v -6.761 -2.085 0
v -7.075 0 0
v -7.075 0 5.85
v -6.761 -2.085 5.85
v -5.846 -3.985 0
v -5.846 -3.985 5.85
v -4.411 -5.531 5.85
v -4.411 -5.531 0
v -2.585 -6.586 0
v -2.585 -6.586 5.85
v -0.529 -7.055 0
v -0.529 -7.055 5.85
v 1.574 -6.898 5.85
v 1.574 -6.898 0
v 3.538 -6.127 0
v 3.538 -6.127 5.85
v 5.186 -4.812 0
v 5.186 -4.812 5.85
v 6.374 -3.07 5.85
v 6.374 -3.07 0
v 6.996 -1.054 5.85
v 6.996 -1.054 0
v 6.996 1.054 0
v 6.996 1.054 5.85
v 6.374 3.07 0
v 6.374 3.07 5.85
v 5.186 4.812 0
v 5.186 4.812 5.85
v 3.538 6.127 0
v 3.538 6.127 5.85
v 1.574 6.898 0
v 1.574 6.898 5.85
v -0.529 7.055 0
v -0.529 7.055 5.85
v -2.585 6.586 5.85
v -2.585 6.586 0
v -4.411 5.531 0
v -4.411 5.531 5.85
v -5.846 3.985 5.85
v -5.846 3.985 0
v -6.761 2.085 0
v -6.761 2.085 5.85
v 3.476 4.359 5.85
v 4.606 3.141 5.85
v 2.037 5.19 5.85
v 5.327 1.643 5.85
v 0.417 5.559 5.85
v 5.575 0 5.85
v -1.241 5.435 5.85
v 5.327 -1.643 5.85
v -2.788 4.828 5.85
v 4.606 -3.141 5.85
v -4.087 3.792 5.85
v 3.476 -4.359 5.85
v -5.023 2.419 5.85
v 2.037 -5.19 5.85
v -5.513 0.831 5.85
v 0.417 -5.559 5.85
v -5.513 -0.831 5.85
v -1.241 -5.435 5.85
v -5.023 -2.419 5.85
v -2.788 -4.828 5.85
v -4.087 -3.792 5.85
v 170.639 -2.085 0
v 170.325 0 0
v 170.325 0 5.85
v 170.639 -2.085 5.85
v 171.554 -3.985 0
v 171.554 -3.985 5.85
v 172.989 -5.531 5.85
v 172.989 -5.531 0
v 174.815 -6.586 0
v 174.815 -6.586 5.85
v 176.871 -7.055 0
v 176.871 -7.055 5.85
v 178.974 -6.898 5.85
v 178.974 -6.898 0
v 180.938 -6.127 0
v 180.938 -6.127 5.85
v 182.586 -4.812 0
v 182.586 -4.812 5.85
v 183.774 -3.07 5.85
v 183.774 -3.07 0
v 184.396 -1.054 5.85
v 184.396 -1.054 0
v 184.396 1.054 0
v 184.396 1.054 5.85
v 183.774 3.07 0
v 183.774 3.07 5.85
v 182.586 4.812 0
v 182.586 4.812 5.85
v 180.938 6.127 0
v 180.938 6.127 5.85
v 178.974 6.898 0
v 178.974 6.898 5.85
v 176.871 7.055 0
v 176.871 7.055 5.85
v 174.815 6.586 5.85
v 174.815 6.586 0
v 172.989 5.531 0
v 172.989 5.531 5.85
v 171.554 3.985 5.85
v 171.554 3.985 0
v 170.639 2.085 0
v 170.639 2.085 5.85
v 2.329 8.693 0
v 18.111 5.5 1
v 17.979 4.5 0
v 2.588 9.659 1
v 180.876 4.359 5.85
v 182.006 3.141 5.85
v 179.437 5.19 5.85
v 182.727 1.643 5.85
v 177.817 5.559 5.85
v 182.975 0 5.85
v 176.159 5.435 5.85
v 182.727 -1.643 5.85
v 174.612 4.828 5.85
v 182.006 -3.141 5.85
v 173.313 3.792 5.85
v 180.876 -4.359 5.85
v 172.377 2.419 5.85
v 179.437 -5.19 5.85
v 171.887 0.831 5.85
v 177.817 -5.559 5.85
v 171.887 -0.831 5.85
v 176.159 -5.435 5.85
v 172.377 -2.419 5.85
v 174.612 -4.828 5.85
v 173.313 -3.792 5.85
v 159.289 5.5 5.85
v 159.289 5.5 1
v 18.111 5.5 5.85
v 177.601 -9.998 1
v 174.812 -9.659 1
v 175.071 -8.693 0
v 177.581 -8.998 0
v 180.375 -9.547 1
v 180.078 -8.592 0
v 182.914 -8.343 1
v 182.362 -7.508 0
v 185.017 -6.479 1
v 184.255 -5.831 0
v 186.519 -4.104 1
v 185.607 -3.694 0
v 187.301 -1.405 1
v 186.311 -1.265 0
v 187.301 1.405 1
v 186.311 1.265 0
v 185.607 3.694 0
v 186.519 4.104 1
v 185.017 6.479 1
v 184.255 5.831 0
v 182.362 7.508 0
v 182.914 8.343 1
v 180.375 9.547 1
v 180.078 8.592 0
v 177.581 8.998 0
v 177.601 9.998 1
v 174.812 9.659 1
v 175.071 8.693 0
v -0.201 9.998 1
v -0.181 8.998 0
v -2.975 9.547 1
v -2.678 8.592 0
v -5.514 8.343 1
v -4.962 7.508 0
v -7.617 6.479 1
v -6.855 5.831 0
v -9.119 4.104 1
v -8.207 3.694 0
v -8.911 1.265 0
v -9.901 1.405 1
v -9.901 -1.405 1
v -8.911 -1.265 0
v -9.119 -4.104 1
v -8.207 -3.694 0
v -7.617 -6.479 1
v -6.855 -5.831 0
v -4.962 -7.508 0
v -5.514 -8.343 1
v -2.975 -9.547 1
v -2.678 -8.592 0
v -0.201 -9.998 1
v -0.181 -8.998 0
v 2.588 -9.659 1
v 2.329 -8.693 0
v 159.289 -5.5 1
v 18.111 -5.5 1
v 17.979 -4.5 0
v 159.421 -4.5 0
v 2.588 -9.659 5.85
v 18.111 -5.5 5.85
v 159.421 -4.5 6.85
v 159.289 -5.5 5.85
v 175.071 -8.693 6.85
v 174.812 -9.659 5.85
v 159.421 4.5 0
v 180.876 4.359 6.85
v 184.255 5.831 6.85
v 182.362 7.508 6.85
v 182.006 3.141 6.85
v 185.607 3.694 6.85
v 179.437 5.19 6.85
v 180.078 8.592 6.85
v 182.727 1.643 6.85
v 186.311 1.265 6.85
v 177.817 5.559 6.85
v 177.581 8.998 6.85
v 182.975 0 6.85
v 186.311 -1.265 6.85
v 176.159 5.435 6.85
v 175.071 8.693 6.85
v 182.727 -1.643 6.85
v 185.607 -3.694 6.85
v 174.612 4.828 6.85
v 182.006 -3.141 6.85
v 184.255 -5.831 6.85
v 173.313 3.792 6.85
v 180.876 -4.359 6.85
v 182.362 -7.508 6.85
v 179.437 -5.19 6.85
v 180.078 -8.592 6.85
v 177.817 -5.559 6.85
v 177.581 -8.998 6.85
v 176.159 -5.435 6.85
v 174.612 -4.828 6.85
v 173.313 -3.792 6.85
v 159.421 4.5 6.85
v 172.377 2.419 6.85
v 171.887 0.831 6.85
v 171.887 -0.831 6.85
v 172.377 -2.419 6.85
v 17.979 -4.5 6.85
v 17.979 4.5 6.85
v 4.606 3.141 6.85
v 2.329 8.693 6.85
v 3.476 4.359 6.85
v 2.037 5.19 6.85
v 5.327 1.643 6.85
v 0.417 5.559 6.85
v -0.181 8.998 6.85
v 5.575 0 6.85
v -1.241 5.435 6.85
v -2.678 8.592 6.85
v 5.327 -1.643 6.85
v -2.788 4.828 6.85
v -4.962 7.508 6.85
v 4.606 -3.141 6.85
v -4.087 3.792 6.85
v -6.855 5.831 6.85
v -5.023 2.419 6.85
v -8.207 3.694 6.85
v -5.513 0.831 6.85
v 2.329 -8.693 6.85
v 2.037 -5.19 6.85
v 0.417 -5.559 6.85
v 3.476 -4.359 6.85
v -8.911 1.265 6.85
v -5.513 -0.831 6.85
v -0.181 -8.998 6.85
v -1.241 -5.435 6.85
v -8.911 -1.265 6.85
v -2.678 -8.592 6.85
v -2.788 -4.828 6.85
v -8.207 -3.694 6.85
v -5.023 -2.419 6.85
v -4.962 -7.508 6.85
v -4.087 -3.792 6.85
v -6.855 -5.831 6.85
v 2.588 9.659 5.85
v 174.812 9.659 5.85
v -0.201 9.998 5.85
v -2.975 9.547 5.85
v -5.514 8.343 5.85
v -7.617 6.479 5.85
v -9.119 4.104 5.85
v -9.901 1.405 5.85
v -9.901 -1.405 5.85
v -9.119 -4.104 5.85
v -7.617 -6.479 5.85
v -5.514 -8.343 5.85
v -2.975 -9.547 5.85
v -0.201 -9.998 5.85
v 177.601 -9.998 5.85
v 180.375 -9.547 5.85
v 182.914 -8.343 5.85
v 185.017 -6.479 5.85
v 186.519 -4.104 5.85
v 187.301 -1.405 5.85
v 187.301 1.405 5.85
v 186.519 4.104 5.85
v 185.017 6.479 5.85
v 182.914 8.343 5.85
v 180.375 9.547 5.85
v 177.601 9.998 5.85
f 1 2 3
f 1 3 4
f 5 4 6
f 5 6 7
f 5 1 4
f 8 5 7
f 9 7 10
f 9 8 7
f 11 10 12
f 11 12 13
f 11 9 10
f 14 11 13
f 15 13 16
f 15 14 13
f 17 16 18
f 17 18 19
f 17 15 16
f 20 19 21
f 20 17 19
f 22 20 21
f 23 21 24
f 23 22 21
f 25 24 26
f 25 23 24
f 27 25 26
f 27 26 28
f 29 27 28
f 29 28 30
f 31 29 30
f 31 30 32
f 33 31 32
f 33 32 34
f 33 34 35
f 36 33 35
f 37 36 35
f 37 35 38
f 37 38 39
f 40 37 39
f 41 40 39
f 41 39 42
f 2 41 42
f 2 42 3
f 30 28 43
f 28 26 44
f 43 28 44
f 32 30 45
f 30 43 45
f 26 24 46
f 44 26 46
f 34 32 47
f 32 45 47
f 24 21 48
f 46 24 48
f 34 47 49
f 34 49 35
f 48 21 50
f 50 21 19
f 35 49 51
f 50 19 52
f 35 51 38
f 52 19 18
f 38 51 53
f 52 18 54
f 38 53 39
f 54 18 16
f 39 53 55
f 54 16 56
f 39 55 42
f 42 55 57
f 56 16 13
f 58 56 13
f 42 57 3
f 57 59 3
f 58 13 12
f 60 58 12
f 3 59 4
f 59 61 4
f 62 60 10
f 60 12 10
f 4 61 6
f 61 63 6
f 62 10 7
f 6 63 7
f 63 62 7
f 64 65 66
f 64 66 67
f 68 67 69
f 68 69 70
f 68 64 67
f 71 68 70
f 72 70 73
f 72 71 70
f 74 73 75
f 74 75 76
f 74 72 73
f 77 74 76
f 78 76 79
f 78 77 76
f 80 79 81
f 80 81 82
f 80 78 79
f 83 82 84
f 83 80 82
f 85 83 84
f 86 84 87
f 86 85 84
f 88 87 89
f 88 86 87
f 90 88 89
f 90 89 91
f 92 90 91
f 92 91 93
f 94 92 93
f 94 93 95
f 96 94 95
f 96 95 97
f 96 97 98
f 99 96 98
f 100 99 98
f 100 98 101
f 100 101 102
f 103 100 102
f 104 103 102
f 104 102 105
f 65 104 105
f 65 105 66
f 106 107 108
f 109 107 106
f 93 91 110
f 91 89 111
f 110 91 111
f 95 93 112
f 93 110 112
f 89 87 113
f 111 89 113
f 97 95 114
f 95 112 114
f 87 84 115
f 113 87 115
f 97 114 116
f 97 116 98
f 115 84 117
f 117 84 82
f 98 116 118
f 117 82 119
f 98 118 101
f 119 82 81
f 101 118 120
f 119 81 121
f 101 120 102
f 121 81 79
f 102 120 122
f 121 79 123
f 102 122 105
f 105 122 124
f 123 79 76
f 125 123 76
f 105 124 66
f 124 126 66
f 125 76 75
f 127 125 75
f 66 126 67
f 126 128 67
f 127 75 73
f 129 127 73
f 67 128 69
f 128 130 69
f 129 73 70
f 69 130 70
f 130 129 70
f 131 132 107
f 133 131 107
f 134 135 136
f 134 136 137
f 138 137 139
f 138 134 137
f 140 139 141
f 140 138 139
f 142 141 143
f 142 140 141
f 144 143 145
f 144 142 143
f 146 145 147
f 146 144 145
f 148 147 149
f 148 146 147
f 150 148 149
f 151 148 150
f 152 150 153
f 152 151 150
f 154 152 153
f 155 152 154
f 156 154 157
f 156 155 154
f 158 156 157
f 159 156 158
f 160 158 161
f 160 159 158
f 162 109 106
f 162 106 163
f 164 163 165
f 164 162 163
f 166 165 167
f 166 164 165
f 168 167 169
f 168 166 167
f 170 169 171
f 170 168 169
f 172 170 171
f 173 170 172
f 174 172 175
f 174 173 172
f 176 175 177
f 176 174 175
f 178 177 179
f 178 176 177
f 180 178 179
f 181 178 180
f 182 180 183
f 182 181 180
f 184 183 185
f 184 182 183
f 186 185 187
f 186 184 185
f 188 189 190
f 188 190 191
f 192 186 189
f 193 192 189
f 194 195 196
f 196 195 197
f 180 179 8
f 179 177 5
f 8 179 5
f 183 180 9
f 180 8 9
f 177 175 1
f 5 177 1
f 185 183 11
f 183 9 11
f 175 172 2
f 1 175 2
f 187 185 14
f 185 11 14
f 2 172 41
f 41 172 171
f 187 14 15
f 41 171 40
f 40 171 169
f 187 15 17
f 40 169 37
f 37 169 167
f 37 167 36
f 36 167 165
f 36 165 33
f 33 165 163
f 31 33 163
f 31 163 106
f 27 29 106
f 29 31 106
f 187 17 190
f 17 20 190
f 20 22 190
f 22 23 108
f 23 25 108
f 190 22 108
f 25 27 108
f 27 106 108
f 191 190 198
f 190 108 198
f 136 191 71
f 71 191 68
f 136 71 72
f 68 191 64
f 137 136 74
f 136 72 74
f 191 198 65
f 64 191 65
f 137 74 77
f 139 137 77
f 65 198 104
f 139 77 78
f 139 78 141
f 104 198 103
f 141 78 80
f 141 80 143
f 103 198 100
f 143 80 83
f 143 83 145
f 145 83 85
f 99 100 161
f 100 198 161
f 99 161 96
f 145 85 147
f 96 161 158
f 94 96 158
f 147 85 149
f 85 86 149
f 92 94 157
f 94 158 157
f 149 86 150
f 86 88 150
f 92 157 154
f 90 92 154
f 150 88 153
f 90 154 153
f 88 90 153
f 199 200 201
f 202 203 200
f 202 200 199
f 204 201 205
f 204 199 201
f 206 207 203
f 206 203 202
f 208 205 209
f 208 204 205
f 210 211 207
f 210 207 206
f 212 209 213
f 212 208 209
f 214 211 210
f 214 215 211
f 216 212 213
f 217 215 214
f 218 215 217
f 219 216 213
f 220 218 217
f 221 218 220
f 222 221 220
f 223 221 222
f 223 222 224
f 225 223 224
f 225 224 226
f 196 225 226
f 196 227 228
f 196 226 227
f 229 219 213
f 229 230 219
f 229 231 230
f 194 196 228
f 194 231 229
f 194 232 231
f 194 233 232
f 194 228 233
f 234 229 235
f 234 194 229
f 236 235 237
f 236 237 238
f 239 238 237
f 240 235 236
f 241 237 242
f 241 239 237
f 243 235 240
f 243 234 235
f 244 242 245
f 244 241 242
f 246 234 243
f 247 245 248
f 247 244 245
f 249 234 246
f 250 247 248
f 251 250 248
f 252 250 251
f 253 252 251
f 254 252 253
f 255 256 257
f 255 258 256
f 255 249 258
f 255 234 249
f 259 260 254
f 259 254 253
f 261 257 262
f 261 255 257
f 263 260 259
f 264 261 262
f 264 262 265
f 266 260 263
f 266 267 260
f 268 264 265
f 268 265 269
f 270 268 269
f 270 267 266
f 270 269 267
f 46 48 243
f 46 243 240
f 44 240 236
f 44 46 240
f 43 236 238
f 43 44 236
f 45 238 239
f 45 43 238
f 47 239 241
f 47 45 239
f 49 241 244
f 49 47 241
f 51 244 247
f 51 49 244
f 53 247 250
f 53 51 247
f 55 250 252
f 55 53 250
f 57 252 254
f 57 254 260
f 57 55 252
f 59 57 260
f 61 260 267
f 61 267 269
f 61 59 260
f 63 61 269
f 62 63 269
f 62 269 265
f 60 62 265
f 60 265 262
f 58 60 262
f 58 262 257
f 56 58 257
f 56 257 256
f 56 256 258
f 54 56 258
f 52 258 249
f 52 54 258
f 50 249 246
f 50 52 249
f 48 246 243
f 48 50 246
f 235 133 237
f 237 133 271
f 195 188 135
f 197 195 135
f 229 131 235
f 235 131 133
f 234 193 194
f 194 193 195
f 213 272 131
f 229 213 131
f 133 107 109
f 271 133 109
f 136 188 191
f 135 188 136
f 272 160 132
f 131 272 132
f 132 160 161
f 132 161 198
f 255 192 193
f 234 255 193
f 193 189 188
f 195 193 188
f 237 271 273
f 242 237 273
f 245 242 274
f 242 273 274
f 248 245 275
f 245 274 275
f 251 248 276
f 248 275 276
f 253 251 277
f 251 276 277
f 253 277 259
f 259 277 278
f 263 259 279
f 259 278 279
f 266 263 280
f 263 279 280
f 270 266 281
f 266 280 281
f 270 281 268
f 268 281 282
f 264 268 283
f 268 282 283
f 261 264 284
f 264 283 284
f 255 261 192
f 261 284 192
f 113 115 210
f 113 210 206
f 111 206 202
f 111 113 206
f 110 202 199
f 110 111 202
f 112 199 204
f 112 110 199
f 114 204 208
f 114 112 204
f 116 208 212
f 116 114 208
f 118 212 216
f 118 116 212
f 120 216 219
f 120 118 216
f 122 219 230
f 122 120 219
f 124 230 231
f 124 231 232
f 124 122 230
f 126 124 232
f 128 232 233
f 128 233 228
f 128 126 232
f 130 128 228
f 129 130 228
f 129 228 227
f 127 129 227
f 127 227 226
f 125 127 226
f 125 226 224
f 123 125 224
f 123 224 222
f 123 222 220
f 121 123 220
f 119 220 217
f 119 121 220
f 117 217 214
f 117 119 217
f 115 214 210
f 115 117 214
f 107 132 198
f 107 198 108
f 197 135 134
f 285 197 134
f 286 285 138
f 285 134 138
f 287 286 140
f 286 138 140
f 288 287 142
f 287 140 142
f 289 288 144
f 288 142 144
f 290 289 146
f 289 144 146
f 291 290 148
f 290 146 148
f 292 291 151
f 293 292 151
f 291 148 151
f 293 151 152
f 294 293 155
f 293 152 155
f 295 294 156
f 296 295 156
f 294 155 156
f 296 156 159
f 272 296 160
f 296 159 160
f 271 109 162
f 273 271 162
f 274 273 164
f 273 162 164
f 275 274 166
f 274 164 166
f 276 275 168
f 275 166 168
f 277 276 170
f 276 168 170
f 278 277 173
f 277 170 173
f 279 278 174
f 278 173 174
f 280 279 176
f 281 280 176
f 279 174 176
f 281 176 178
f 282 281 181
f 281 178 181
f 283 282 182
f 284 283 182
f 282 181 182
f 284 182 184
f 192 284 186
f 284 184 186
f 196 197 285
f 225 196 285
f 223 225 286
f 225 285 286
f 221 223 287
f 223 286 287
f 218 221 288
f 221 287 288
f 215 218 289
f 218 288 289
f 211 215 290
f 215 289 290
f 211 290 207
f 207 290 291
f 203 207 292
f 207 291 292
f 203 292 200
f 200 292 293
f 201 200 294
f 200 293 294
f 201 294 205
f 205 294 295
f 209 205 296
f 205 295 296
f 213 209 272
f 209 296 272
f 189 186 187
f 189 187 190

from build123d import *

# Parameters (mm, degrees)
SKETCH_1_R      = 7.075
EXTRUDE_1_DEPTH = 6.85
EXTRUDE_START   = -1
SKETCH_2_R      = 7.075
SKETCH_2_R_2    = 5.575
EXTRUDE_2_DEPTH = 1
CHAMFER_1_SIZE  = 1


with BuildPart() as part:
    # 草图1 → 凸台-拉伸1 (new body)
    with BuildSketch(Plane.XY):
        with BuildLine():
            ThreePointArc((2.588190451, 9.659258263), (-10, 0), (2.588190451, -9.659258263))
            Line((2.588190451, -9.659258263), (18.11075361, -5.5))
            Line((18.11075361, -5.5), (159.28924639, -5.5))
            Line((159.28924639, -5.5), (174.811809549, -9.659258263))
            ThreePointArc((174.811809549, -9.659258263), (187.4, 0), (174.811809549, 9.659258263))
            Line((174.811809549, 9.659258263), (159.28924639, 5.5))
            Line((159.28924639, 5.5), (18.11075361, 5.5))
            Line((18.11075361, 5.5), (2.588190451, 9.659258263))
        make_face()
        with Locations(Location((0, 0, 0), (0, 0, 180))):
            Circle(SKETCH_1_R, mode=Mode.SUBTRACT)
        with Locations(Location((177.4, 0, 0), (0, 0, 180))):
            Circle(SKETCH_1_R, mode=Mode.SUBTRACT)
    extrude(amount=EXTRUDE_1_DEPTH)

    # 草图2 → 凸台-拉伸2 (add)
    # profile 1 of 2: a face of its own
    with BuildSketch(Plane.XY.offset(6.85).offset(EXTRUDE_START)):
        with Locations(Location((0, 0, 0), (0, 0, 180))):
            Circle(SKETCH_2_R)
        Circle(SKETCH_2_R_2, mode=Mode.SUBTRACT)
    # profile 2 of 2: a face of its own
    with BuildSketch(Plane.XY.offset(6.85).offset(EXTRUDE_START)):
        with Locations(Location((177.4, 0, 0), (0, 0, 180))):
            Circle(SKETCH_2_R)
        with Locations((177.4, 0)):
            Circle(SKETCH_2_R_2, mode=Mode.SUBTRACT)
    extrude(amount=EXTRUDE_2_DEPTH)

    # 倒角1
    chamfer_1_edges = [part.edges().sort_by_distance(p)[0] for p in [
        (187.4, 0, 6.85),
        (88.7, -5.5, 0),
        (10.34947203, -7.579629131, 0),
        (-10, 0, 0),
        (10.34947203, 7.579629131, 0),
        (88.7, 5.5, 0),
        (167.05052797, 7.579629131, 0),
        (187.4, 0, 0),
        (167.05052797, -7.579629131, 0),
        (167.05052797, 7.579629131, 6.85),
        (88.7, 5.5, 6.85),
        (10.34947203, 7.579629131, 6.85),
        (-10, 0, 6.85),
        (10.34947203, -7.579629131, 6.85),
        (88.7, -5.5, 6.85),
        (167.05052797, -7.579629131, 6.85),
    ]]
    chamfer(chamfer_1_edges, length=CHAMFER_1_SIZE)


solid = part.part
